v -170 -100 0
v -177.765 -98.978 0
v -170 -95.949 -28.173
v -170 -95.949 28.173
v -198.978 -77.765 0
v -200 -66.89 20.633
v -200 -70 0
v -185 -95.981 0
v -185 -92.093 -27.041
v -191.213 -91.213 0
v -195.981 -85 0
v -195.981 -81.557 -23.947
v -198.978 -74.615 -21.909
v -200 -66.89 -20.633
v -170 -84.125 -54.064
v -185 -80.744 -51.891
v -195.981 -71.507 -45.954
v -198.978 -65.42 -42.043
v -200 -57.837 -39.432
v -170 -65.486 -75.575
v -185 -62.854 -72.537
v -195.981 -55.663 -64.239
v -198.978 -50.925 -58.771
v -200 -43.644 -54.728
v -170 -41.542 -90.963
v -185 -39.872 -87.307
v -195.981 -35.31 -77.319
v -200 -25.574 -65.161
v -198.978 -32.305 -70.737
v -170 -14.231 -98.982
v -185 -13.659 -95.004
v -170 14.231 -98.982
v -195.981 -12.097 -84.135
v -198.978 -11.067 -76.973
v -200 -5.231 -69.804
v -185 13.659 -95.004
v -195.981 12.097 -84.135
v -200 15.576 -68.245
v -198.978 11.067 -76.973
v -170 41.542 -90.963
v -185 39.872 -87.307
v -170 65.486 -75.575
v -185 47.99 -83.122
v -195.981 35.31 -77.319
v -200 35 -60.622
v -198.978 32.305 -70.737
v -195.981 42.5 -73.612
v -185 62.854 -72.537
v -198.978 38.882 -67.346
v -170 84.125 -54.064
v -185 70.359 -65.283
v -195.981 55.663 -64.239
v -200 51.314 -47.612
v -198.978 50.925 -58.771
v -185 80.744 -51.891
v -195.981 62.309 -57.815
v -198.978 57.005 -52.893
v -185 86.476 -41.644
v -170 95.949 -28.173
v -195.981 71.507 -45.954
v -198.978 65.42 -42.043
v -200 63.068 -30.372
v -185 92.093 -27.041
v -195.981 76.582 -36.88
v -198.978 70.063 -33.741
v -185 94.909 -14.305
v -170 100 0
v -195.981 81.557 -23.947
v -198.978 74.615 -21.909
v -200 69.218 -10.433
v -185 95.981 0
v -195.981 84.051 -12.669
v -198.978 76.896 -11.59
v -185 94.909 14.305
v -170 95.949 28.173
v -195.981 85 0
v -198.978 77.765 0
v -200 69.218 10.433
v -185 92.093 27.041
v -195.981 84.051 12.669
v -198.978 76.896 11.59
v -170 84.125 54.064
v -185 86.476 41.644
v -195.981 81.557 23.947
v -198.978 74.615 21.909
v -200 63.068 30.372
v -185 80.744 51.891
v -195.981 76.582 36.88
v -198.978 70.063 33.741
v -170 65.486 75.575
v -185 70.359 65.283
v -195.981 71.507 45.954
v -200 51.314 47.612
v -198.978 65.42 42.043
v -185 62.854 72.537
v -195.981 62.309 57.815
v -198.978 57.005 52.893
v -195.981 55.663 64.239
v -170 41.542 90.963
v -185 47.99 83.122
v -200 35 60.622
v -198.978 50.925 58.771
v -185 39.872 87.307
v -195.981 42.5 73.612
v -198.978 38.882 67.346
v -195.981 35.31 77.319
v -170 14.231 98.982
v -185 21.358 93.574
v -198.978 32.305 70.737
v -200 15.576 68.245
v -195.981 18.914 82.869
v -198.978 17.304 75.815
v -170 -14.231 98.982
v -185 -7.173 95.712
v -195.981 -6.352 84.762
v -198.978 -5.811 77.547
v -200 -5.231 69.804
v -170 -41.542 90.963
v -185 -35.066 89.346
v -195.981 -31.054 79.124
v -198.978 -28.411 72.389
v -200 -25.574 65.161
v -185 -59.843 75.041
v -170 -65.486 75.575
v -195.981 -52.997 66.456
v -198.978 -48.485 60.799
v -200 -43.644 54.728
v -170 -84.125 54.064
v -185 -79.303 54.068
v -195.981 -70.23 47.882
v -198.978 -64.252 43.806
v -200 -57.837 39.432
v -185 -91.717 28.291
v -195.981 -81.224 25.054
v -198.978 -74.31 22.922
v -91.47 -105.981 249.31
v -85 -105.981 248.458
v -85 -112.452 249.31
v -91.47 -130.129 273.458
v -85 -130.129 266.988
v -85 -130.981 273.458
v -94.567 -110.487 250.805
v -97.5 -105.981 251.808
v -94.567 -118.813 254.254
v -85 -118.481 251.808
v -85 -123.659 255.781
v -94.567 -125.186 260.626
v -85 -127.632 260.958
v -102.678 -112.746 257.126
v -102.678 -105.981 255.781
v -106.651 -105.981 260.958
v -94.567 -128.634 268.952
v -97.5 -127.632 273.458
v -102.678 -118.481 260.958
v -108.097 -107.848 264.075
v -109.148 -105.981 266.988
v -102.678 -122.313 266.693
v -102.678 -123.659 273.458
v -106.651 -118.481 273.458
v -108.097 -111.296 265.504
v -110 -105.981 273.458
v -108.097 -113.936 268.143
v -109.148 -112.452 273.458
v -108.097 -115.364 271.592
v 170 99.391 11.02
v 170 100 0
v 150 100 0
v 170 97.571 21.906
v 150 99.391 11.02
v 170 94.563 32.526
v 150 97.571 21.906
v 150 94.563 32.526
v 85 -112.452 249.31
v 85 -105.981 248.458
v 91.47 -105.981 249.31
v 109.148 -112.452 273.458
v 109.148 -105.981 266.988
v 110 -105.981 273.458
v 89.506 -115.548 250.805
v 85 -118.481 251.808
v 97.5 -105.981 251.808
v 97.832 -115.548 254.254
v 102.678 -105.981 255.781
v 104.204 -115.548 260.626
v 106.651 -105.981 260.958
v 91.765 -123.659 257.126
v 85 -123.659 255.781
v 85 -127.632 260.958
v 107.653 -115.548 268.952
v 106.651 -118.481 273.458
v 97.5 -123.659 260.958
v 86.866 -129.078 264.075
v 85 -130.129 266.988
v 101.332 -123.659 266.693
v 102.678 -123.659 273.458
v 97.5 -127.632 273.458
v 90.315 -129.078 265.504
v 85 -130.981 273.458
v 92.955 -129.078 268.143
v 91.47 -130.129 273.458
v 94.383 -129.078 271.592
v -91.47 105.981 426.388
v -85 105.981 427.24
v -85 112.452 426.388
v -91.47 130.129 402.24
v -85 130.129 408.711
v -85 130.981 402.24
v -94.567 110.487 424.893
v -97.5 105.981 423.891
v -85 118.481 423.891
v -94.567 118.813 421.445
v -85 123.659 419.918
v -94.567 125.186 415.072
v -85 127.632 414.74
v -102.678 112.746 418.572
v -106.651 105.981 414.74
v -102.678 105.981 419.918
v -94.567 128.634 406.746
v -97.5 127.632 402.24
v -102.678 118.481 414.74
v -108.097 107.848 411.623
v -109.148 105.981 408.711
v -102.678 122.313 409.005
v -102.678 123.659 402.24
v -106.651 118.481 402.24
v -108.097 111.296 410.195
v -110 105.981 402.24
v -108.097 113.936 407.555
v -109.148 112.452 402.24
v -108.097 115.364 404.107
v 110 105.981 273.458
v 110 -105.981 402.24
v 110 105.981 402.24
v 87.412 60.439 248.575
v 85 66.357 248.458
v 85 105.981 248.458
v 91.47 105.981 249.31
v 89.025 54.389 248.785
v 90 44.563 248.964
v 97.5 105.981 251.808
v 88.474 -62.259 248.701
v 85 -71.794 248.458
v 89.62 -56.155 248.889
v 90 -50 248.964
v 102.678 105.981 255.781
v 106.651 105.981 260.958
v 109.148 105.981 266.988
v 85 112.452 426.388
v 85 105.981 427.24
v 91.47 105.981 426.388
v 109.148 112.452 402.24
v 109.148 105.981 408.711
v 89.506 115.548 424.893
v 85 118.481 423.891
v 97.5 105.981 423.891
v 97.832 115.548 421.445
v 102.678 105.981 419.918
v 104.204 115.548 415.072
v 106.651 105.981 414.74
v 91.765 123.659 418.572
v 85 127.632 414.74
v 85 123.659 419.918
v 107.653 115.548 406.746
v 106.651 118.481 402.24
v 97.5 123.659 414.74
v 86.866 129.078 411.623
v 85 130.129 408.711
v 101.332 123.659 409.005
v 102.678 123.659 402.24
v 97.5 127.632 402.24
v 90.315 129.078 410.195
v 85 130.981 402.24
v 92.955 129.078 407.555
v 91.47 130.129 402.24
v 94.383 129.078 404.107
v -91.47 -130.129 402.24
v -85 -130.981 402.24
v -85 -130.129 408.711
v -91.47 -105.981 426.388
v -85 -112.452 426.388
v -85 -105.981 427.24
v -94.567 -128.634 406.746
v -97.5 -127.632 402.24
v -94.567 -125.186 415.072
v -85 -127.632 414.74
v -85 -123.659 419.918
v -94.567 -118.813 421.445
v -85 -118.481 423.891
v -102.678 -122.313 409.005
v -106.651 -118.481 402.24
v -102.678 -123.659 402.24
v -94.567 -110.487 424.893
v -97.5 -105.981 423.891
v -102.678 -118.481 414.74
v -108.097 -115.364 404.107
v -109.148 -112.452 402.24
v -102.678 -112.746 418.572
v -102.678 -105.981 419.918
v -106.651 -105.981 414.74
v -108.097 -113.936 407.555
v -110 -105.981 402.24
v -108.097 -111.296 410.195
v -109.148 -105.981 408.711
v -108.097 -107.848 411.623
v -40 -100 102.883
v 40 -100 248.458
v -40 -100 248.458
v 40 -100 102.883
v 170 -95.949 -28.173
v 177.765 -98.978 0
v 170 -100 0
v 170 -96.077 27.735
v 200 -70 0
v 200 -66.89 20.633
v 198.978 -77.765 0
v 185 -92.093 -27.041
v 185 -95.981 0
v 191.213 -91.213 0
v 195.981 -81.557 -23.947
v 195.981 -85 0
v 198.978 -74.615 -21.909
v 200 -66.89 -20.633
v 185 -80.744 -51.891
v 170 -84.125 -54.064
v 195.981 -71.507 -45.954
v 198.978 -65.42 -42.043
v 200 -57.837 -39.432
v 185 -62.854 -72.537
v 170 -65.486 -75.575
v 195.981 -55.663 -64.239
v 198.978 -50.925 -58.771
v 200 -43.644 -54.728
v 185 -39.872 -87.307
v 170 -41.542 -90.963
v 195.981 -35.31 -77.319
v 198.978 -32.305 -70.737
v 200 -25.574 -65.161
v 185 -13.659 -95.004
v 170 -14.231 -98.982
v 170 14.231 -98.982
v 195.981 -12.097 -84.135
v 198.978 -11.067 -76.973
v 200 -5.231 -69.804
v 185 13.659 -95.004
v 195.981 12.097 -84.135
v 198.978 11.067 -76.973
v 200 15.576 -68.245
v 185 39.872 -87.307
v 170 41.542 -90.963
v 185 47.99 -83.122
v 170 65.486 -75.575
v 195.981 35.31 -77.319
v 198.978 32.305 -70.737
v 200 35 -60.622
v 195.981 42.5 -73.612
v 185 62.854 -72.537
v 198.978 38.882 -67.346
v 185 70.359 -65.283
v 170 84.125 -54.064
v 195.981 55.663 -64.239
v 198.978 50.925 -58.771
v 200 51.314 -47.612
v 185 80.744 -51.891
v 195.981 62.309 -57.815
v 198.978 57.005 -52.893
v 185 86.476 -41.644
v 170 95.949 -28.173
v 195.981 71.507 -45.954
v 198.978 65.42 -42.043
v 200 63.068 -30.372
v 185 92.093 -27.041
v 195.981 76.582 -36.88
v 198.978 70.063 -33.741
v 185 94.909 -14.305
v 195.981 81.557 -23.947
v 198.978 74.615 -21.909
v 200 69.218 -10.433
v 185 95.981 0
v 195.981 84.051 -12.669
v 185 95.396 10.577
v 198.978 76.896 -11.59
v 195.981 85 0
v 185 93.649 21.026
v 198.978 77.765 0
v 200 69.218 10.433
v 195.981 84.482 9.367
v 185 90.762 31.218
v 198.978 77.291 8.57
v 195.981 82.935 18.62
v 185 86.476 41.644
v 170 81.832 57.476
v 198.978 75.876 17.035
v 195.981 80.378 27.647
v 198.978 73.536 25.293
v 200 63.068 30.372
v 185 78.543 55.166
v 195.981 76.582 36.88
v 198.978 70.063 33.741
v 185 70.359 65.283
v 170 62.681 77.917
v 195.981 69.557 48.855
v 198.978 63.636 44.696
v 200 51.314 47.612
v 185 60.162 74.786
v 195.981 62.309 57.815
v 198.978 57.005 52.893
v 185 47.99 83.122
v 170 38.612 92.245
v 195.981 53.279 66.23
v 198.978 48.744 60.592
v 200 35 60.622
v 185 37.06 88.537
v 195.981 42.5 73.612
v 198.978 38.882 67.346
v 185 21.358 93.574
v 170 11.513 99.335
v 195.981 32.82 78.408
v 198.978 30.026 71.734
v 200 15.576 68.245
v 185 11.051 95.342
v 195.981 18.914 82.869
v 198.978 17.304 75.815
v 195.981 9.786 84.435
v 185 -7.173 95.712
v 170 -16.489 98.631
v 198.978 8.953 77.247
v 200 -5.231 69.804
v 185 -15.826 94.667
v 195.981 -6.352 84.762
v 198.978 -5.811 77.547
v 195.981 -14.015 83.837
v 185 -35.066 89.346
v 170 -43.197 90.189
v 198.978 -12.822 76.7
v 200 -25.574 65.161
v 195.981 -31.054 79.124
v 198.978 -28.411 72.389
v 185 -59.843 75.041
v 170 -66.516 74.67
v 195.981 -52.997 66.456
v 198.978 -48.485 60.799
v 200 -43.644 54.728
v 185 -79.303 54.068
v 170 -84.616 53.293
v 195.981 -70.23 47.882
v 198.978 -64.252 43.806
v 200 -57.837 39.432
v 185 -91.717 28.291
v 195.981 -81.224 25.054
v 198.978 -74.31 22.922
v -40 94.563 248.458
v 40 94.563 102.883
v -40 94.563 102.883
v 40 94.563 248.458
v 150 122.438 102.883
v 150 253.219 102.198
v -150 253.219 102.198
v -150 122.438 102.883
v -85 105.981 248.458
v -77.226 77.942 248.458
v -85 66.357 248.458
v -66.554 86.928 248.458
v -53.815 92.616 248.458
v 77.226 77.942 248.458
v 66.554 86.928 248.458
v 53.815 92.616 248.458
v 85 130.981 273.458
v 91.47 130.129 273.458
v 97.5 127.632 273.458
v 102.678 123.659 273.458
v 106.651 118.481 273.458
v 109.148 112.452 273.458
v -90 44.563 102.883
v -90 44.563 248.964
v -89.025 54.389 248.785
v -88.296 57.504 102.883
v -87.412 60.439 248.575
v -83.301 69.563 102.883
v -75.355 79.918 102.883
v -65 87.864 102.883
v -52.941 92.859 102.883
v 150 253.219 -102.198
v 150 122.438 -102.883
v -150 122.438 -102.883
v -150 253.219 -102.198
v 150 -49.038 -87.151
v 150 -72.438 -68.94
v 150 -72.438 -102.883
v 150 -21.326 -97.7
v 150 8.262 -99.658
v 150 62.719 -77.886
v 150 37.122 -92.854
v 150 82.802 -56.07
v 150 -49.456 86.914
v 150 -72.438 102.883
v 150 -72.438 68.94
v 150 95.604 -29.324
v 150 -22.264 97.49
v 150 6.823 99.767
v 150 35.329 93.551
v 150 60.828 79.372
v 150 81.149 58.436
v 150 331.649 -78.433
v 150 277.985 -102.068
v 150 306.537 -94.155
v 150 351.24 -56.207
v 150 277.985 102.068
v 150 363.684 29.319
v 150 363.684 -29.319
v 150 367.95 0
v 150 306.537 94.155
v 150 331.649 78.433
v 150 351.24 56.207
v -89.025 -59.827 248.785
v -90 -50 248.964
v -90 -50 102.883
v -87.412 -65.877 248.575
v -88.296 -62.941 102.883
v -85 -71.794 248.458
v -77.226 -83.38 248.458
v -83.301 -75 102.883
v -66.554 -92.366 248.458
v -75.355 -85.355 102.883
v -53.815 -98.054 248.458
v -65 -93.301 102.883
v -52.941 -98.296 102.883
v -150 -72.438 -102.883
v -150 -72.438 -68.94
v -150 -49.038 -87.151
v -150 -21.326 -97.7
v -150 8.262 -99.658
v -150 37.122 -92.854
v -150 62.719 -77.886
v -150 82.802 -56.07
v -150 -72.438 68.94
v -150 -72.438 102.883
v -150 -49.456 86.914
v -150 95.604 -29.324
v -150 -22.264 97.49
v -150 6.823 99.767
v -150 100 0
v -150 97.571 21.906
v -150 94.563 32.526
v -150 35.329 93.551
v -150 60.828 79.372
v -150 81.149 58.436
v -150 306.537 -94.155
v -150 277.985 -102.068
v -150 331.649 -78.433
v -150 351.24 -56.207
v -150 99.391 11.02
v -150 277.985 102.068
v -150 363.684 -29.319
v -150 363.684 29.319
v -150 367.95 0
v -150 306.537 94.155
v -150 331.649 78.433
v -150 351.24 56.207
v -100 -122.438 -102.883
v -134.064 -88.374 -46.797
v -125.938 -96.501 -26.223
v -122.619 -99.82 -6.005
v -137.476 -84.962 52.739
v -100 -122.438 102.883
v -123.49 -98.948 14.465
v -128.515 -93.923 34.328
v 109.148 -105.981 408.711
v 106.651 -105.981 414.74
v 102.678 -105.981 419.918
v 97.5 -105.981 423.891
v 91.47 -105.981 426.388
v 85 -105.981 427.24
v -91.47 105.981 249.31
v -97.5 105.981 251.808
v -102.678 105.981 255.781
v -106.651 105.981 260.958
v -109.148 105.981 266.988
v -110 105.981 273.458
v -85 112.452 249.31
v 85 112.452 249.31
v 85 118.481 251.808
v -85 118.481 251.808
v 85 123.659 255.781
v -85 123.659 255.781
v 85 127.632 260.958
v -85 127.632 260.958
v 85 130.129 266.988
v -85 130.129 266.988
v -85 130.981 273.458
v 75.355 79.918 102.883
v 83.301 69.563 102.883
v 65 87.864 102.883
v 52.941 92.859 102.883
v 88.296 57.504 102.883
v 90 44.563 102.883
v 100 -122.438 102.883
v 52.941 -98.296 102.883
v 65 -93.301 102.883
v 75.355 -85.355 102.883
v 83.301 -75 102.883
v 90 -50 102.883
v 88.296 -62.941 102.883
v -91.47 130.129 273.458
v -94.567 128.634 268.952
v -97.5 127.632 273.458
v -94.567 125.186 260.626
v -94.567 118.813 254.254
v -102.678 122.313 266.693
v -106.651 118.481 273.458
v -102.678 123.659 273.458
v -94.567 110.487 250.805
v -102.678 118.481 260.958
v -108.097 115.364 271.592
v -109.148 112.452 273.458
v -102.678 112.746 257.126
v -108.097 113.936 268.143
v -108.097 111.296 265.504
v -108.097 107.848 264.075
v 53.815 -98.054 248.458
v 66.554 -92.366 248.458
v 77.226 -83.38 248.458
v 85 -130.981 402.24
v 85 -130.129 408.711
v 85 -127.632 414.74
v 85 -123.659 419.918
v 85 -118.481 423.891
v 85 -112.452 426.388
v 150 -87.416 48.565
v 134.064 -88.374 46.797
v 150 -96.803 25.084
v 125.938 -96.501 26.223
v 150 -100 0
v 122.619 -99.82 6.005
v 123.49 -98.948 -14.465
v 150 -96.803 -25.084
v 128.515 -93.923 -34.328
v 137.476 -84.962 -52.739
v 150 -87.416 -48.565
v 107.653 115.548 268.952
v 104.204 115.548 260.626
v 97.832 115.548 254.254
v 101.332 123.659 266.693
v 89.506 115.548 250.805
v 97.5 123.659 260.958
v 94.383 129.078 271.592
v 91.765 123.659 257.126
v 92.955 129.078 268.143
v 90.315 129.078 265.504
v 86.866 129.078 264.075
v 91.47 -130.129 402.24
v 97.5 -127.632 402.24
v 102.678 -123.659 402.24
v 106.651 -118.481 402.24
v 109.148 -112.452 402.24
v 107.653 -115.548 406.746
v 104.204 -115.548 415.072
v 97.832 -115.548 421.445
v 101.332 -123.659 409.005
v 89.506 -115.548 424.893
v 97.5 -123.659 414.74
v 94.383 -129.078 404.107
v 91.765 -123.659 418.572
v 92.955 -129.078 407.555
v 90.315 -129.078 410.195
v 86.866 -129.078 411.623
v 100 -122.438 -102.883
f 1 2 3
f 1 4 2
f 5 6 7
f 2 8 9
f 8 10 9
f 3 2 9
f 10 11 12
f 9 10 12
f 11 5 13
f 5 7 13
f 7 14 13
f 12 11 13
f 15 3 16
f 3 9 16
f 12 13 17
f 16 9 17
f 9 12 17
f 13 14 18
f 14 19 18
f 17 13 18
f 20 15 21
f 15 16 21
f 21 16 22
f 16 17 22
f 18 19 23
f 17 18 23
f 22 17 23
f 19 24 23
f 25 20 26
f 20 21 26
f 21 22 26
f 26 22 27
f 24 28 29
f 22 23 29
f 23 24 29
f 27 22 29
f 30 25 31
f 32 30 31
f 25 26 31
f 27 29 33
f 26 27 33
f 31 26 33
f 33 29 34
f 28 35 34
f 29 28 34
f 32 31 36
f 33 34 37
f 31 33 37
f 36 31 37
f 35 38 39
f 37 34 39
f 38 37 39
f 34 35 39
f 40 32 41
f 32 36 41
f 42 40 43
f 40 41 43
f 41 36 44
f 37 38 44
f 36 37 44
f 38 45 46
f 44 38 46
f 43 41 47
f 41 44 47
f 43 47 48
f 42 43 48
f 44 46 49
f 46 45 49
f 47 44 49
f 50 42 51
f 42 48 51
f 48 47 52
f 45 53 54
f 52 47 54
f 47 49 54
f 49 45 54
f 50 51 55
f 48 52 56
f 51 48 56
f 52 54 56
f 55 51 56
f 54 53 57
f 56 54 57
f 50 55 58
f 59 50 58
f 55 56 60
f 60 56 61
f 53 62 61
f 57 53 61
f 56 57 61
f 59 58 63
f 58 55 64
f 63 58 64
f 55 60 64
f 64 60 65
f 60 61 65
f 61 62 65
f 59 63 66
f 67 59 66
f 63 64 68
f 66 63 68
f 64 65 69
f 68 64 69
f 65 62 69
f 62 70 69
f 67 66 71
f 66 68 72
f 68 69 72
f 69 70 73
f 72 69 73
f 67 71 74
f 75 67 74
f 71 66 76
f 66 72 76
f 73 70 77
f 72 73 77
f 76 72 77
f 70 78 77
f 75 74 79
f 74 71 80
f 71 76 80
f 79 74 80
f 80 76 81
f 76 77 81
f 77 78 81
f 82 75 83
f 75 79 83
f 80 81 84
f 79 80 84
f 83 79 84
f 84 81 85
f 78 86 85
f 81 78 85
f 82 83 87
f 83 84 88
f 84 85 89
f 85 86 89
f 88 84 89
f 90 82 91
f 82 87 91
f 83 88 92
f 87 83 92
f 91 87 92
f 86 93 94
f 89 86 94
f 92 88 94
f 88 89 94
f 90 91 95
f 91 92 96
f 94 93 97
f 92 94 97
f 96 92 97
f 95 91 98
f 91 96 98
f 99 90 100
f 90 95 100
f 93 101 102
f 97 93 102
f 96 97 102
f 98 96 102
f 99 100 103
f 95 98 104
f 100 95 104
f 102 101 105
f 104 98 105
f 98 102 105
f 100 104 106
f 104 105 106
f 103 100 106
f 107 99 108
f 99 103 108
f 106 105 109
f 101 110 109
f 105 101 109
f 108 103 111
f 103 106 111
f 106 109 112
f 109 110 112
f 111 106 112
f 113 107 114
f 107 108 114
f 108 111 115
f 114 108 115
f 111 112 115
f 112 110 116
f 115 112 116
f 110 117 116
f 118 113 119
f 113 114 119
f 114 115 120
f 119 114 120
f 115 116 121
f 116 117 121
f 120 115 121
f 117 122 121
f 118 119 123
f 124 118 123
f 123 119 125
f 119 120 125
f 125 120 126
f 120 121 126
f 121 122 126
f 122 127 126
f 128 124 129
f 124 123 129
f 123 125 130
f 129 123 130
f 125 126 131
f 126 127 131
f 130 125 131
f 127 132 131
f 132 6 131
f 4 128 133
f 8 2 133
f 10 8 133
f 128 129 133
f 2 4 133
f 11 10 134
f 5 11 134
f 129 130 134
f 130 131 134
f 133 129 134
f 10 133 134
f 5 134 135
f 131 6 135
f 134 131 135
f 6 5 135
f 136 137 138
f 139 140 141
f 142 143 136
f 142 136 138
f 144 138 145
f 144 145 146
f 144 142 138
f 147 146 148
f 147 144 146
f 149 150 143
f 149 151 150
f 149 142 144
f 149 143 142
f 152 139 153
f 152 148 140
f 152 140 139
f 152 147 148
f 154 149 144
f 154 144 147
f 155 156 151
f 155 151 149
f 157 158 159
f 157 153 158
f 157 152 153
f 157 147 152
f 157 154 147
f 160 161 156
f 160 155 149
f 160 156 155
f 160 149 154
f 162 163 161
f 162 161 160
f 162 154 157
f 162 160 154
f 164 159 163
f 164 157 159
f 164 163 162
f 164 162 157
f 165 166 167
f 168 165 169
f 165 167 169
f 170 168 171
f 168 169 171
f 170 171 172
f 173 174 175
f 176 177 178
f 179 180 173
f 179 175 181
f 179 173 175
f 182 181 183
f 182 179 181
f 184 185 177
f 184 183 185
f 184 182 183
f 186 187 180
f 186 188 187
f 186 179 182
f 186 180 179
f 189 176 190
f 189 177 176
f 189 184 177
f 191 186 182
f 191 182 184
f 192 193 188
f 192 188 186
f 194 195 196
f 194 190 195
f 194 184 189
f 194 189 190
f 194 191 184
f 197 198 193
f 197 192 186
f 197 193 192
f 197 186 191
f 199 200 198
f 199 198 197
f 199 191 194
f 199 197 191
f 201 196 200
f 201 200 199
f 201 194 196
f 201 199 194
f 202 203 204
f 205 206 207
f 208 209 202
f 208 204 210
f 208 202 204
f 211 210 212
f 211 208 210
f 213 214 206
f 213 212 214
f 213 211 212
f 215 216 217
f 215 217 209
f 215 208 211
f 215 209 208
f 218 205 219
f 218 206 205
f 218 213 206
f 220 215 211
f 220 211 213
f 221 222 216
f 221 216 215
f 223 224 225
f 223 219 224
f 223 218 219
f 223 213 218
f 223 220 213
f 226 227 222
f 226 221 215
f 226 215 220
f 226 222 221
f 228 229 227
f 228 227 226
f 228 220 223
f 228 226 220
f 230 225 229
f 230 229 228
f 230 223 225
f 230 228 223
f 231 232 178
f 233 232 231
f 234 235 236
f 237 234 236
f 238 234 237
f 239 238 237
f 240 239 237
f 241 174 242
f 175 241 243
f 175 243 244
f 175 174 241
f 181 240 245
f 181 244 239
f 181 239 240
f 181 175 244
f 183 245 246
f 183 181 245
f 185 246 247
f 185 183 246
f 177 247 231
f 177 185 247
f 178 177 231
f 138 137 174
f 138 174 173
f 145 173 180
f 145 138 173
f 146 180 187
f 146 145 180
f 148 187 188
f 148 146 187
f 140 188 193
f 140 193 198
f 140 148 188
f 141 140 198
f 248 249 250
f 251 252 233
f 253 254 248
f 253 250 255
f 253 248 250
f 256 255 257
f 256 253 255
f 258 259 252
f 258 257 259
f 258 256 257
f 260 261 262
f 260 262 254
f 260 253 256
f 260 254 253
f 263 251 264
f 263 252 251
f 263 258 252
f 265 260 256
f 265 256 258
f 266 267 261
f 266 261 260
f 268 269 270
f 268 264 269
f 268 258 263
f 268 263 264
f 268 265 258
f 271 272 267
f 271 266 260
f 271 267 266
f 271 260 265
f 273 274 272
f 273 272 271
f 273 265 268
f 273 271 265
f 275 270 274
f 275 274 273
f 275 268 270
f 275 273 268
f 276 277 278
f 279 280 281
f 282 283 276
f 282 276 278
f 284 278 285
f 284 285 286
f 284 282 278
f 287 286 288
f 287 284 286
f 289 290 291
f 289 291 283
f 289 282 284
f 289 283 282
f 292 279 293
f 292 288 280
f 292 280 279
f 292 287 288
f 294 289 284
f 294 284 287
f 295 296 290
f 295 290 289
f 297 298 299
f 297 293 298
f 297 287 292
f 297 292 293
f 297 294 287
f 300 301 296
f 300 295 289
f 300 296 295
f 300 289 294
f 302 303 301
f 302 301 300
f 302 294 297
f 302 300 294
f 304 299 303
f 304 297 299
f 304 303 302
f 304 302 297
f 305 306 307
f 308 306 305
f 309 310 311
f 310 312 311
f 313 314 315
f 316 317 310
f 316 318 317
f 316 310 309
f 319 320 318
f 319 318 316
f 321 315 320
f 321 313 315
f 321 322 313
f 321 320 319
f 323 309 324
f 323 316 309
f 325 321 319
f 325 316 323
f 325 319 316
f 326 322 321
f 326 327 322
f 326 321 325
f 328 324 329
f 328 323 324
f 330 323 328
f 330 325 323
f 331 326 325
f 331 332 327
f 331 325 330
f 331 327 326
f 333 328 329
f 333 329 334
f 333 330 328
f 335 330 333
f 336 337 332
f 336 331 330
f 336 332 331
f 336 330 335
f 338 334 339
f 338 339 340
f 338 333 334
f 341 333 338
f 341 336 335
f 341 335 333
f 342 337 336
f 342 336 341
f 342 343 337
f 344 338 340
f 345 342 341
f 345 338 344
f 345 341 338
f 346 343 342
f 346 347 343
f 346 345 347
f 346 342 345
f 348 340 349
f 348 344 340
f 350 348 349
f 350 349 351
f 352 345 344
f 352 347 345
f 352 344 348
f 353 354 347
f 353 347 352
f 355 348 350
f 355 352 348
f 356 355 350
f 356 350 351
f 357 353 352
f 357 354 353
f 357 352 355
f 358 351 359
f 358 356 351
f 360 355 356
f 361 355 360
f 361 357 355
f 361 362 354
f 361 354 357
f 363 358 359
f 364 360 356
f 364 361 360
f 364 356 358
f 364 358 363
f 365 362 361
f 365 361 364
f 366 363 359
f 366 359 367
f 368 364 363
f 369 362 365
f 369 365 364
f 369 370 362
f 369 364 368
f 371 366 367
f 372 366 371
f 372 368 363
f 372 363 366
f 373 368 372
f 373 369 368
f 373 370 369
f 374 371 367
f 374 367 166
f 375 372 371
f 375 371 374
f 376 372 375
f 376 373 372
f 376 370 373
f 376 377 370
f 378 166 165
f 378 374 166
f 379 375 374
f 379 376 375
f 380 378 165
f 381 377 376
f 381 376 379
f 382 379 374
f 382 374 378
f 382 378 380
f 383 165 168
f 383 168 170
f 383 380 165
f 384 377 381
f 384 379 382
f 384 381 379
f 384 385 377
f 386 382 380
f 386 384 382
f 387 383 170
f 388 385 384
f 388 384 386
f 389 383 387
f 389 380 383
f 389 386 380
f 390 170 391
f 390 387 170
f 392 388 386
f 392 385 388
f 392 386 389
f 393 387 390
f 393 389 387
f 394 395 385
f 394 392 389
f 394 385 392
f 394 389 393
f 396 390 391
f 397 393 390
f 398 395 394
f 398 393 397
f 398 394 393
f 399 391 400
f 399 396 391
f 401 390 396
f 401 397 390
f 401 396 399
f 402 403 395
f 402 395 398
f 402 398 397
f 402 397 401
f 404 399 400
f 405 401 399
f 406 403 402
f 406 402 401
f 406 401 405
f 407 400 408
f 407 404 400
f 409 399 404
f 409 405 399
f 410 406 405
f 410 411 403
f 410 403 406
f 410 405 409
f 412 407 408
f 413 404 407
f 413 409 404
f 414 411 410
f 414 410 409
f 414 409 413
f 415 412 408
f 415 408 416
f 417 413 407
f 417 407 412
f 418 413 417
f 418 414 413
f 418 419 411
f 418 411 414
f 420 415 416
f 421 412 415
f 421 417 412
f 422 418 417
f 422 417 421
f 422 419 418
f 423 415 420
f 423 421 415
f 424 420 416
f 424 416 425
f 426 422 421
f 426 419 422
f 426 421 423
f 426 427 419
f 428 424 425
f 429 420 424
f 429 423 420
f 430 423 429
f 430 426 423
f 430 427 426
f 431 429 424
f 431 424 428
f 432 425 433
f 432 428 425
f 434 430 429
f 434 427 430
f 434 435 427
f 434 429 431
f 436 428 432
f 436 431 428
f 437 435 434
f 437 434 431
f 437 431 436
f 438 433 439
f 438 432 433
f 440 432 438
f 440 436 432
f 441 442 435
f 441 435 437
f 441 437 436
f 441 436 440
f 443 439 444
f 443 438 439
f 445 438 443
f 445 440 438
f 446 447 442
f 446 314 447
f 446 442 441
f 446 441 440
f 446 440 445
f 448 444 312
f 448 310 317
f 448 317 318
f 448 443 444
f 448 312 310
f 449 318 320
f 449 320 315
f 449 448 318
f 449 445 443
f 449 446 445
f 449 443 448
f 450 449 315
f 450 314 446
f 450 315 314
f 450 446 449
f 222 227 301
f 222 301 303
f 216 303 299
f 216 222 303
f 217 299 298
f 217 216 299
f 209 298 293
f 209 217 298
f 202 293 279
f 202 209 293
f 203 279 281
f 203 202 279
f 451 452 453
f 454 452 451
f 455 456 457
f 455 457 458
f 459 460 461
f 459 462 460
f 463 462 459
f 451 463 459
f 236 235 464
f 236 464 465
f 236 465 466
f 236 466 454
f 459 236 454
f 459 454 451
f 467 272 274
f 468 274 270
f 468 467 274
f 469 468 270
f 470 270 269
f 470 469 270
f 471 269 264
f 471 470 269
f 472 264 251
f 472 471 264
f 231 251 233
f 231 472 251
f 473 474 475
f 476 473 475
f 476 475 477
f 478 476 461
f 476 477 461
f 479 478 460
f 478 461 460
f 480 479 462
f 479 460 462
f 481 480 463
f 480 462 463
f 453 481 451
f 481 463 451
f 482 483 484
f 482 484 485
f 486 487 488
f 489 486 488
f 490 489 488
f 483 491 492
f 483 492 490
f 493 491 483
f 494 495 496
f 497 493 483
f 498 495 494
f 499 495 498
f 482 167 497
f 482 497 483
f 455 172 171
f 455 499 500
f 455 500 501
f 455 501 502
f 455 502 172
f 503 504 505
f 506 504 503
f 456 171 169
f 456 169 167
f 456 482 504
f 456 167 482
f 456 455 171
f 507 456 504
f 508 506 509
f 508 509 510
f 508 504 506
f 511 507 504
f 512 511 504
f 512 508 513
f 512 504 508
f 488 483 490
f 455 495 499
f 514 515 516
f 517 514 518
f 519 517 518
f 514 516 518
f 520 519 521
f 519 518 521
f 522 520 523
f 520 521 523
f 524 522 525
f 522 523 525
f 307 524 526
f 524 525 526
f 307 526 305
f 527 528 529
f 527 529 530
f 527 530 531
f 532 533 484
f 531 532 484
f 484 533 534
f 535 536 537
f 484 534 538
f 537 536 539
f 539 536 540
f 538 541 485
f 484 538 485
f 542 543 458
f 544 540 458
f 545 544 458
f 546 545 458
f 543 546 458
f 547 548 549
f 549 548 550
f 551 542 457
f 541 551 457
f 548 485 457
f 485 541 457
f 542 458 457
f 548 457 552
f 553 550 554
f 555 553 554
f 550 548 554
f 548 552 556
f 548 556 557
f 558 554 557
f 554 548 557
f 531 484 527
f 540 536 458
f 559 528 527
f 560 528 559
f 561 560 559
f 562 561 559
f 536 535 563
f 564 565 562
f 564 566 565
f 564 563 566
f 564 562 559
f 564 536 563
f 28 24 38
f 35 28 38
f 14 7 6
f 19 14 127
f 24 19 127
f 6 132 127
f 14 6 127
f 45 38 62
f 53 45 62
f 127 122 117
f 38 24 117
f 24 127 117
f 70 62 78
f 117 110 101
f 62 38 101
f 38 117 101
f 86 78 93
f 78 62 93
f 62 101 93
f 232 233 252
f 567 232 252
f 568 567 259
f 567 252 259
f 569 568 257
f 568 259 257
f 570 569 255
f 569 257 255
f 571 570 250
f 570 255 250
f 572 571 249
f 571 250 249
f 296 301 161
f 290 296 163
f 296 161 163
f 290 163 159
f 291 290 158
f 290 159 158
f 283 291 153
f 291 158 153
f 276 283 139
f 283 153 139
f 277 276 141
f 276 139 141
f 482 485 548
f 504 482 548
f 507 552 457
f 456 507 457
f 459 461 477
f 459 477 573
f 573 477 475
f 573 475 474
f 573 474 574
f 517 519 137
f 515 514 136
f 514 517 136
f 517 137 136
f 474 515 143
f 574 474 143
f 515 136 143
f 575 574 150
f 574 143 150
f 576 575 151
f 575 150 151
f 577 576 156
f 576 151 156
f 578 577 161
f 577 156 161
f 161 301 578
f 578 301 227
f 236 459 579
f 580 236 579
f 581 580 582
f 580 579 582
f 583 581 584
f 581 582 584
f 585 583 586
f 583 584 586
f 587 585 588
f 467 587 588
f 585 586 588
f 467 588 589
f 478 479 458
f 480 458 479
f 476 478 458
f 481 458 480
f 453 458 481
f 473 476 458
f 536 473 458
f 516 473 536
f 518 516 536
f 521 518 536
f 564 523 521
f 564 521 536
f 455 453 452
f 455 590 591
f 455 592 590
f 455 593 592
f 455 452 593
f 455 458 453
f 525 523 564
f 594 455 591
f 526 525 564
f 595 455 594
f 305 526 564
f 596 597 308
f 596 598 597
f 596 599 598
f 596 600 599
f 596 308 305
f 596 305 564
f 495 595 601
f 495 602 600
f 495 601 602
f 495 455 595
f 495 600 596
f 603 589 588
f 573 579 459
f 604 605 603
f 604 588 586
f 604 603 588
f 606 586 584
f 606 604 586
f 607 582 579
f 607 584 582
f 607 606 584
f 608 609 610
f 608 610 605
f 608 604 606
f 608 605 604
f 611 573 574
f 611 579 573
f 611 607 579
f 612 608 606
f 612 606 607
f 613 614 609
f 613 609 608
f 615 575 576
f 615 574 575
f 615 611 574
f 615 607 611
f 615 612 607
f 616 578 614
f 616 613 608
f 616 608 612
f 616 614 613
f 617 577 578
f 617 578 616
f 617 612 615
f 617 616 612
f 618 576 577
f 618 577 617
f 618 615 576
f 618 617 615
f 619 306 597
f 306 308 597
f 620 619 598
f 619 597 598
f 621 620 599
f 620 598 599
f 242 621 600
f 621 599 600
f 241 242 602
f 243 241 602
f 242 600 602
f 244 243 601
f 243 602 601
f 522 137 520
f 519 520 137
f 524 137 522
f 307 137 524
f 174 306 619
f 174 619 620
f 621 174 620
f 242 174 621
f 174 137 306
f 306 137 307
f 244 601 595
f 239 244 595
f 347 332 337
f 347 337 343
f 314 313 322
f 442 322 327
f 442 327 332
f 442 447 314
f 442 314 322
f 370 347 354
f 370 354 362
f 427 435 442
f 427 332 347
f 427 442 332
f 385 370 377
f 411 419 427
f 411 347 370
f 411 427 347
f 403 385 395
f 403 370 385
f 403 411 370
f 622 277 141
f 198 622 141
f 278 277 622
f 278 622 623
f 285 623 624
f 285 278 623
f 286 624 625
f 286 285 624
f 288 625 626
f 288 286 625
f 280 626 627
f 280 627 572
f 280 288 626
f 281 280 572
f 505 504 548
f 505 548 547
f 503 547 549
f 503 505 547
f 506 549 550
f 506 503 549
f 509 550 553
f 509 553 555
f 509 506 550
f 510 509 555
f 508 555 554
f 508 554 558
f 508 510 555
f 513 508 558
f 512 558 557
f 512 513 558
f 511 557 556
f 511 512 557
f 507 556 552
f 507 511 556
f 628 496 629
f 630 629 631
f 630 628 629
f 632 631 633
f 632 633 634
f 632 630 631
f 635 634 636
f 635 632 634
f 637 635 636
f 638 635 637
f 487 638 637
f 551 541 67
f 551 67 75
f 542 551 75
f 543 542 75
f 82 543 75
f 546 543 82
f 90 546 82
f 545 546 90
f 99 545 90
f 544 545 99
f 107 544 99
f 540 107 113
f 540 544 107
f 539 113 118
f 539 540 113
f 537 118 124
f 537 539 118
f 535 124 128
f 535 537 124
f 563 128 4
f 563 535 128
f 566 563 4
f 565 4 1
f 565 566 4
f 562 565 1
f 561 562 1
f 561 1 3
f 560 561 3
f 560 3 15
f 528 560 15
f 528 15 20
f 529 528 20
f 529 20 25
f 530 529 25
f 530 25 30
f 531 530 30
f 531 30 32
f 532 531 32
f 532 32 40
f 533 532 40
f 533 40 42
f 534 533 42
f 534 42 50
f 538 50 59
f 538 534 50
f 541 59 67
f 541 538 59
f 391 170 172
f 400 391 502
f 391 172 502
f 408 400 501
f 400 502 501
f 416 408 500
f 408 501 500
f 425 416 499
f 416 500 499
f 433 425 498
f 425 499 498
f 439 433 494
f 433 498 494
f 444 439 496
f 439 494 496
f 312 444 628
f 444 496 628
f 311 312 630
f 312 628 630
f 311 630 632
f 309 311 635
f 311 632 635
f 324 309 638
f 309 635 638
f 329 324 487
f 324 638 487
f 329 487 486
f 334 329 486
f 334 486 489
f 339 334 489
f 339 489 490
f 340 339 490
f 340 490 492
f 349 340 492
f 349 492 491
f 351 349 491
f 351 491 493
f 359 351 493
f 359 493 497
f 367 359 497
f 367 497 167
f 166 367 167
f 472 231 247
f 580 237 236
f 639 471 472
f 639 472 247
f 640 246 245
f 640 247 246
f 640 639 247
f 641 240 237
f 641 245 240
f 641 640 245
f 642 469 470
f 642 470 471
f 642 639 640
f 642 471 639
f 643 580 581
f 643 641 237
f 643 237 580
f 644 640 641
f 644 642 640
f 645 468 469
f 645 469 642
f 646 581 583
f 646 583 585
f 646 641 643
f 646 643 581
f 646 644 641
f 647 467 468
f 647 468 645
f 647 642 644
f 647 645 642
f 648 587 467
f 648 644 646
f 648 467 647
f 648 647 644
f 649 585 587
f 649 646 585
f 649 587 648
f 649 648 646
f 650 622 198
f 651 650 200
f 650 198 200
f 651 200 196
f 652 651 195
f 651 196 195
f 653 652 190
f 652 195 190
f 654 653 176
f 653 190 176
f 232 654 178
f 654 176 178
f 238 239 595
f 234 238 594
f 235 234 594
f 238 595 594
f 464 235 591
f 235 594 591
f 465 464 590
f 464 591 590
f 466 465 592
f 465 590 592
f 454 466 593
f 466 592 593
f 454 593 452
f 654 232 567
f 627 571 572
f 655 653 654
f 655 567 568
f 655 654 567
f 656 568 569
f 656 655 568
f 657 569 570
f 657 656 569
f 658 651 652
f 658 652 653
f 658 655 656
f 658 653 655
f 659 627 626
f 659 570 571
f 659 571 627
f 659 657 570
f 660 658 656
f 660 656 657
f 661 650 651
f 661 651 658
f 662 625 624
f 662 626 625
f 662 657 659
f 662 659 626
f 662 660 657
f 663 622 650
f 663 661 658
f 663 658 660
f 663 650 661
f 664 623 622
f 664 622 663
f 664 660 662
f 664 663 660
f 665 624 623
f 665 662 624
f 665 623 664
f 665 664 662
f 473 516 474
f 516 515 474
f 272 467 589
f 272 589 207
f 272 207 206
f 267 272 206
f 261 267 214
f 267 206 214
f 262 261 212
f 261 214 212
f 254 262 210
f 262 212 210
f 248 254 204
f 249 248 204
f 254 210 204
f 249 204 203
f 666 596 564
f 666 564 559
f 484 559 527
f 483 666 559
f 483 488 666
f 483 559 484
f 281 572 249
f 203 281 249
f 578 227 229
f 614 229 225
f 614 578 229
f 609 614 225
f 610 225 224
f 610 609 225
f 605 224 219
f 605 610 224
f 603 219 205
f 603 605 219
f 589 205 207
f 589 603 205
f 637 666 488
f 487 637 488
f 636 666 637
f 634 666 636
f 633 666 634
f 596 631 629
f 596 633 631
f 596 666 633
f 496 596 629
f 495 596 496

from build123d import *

# Parameters (mm, degrees)
F0_W          = 194.5625826716
F0_H          = 54.5296296477
F1_DEPTH      = 90
F0_W_2        = 261.9621157646
F0_H_2        = 41.3846671581
F0_H_3        = 48.0061769485
F2_DEPTH      = 110
F3_DEPTH      = 150
F4_DEPTH      = 200
F5_T1_DEPTH   = 170
F5_T3_DEPTH   = 211.9621157646
F5_T5_DEPTH   = 128.7816882133
F5_S9_W       = 25
F5_S9_H       = 25
F5_T10_DEPTH  = 25
F5_S15_W      = 25
F5_S15_H      = 25
F5_T16_DEPTH  = 25
F5_S21_W      = 25
F5_S21_H      = 25
F5_T22_DEPTH  = 25
F5_S27_W      = 25
F5_S27_H      = 25
F5_T28_DEPTH  = 25
F5_S33_W      = 25
F5_S33_H      = 25
F5_T34_DEPTH  = 25
F5_S39_W      = 25
F5_S39_H      = 25
F5_T40_DEPTH  = 25
F5_S45_W      = 25
F5_S45_H      = 25
F5_T46_DEPTH  = 25
F5_S51_W      = 25
F5_S51_H      = 25
F5_T52_DEPTH  = 25
F5_T58_DEPTH  = 211.9621157646
F5_T64_DEPTH  = 211.9621157646
F5_T70_DEPTH  = 211.9621157646
F5_T77_DEPTH  = 211.9621157646
F5_T83_DEPTH  = 211.9621157646
F5_T89_DEPTH  = 211.9621157646
F5_T95_DEPTH  = 211.9621157646
F5_T101_DEPTH = 211.9621157646
F5_T108_DEPTH = 211.9621157646
F5_T114_DEPTH = 211.9621157646
F6_R          = 50
F8_T4_DEPTH   = 462.9335014381
F8_S5_R       = 100
F8_T6_DEPTH   = 236
F8_T10_DEPTH  = 462.9335014381
F8_S11_R      = 100
F8_T12_DEPTH  = 236


# Not quite as in the source:
# - a fillet or chamfer that OpenCascade refuses, or shapes differently, is made with other operations: its cross-section is extruded or revolved along the edge and cut away or added


with BuildPart() as f1:
    # F0 (on Right) → F1 (new body, symmetric)
    with BuildSketch(Plane.YZ):
        with Locations((-2.7187086642, 130.1474161446)):
            Rectangle(F0_W, F0_H)
        Polygon((-100, 210.3845775127), (-100, 157.4122309685), (94.5625826716, 157.4122309685), (94.5625826716, 209.366121575), align=None)
        Polygon((-100, 248.4584450722), (-100, 210.3845775127), (94.5625826716, 209.366121575), (94.5625826716, 248.4584450722), align=None)
    extrude(amount=F1_DEPTH, both=True)

    # F0 (on Right) → F2 (join, symmetric)
    with BuildSketch(Plane.YZ):
        Polygon((-130.9810578823, 248.4584450722), (-100, 248.4584450722), (94.5625826716, 248.4584450722), (130.9810578823, 248.4584450722), (130.9810578823, 296.4646220207), (-130.9810578823, 296.4646220207), align=None)
        with Locations((0, 317.1569555998)):
            Rectangle(F0_W_2, F0_H_2)
        with Locations((0, 361.8523776531)):
            Rectangle(F0_W_2, F0_H_3)
        with Locations((0, 406.5477997065)):
            Rectangle(F0_W_2, F0_H_2)
    extrude(amount=F2_DEPTH, both=True)

    # F0 (on Right) → F3 (join, symmetric)
    with BuildSketch(Plane.YZ):
        with BuildLine():
            ThreePointArc((100, 0), (0, -100), (-100, 0))
            Line((-100, 0), (-100, 102.8826013207))
            Line((-100, 102.8826013207), (-122.4384903908, 102.8826013207))
            Line((-122.4384903908, 102.8826013207), (-122.4384903908, -102.8826013207))
            Line((-122.4384903908, -102.8826013207), (122.4384903908, -102.8826013207))
            Line((122.4384903908, -102.8826013207), (122.4384903908, 102.8826013207))
            Line((122.4384903908, 102.8826013207), (94.5625826716, 102.8826013207))
            Line((94.5625826716, 102.8826013207), (94.5625826716, 32.525650777))
            ThreePointArc((94.5625826716, 32.525650777), (98.6312786776, 16.4885071009), (100, 0))
        make_face()
        with BuildLine():
            Line((253.218506448, 102.1980211612), (122.4384903908, 102.8826013207))
            Line((122.4384903908, 102.8826013207), (122.4384903908, -102.8826013207))
            Line((122.4384903908, -102.8826013207), (253.218506448, -102.1980211612))
            ThreePointArc((253.218506448, -102.1980211612), (162.1847078204, 0), (253.218506448, 102.1980211612))
        make_face()
        with BuildLine():
            Line((277.9853632955, 102.0683767451), (253.218506448, 102.1980211612))
            ThreePointArc((253.218506448, 102.1980211612), (162.1847078204, 0), (253.218506448, -102.1980211612))
            Line((253.218506448, -102.1980211612), (277.9853632955, -102.0683767451))
            Line((277.9853632955, -102.0683767451), (277.9853632955, 102.0683767451))
        make_face()
        with BuildLine():
            ThreePointArc((367.9499104619, 0), (342.2485007293, 68.0286213263), (277.9853632955, 102.0683767451))
            Line((277.9853632955, 102.0683767451), (277.9853632955, -102.0683767451))
            ThreePointArc((277.9853632955, -102.0683767451), (342.2485007293, -68.0286213263), (367.9499104619, 0))
        make_face()
        with BuildLine():
            Line((-100, 102.8826013207), (-100, 0))
            ThreePointArc((-100, 0), (-16.4885071009, 98.6312786776), (94.5625826716, 32.525650777))
            Line((94.5625826716, 32.525650777), (94.5625826716, 102.8826013207))
            Line((94.5625826716, 102.8826013207), (-100, 102.8826013207))
        make_face()
    extrude(amount=F3_DEPTH, both=True)

    # F0 (on Right) → F4 (join, symmetric)
    with BuildSketch(Plane.YZ):
        with BuildLine():
            ThreePointArc((94.5625826716, 32.525650777), (-16.4885071009, 98.6312786776), (-100, 0))
            Line((-100, 0), (94.5625826716, 0))
            Line((94.5625826716, 0), (94.5625826716, 32.525650777))
        make_face()
        with BuildLine():
            Line((94.5625826716, 0), (-100, 0))
            ThreePointArc((-100, 0), (0, -100), (100, 0))
            ThreePointArc((100, 0), (98.6312786776, 16.4885071009), (94.5625826716, 32.525650777))
            Line((94.5625826716, 32.525650777), (94.5625826716, 0))
        make_face()
    extrude(amount=F4_DEPTH, both=True)

    # F5: fillet of radius 25 on 12 edges, made by hand

    # F5_s2 → F5_t1 (cut)
    with BuildSketch(Plane.YZ.offset(-85)):
        with BuildLine():
            ThreePointArc((-130.9810578823, 402.2401332855), (-123.658727412, 419.9178028152), (-105.9810578823, 427.2401332855))
            Line((-105.9810578823, 427.2401332855), (-130.9810578823, 427.2401332855))
            Line((-130.9810578823, 427.2401332855), (-130.9810578823, 402.2401332855))
        make_face()
        with BuildLine():
            ThreePointArc((130.9810578823, 402.2401332855), (123.658727412, 419.9178028152), (105.9810578823, 427.2401332855))
            Line((105.9810578823, 427.2401332855), (130.9810578823, 427.2401332855))
            Line((130.9810578823, 427.2401332855), (130.9810578823, 402.2401332855))
        make_face()
        with BuildLine():
            ThreePointArc((-105.9810578823, 248.4584450722), (-123.658727412, 255.7807755425), (-130.9810578823, 273.4584450722))
            Line((-130.9810578823, 273.4584450722), (-130.9810578823, 248.4584450722))
            Line((-130.9810578823, 248.4584450722), (-105.9810578823, 248.4584450722))
        make_face()
        with BuildLine():
            ThreePointArc((105.9810578823, 248.4584450722), (123.658727412, 255.7807755425), (130.9810578823, 273.4584450722))
            Line((130.9810578823, 273.4584450722), (130.9810578823, 248.4584450722))
            Line((130.9810578823, 248.4584450722), (105.9810578823, 248.4584450722))
        make_face()
    extrude(amount=F5_T1_DEPTH, mode=Mode.SUBTRACT)

    # F5_s4 → F5_t3 (cut)
    with BuildSketch(Plane.XZ.offset(-105.9810578823)):
        with BuildLine():
            ThreePointArc((110, 402.2401332855), (102.6776695297, 419.9178028152), (85, 427.2401332855))
            Line((85, 427.2401332855), (110, 427.2401332855))
            Line((110, 427.2401332855), (110, 402.2401332855))
        make_face()
        with BuildLine():
            ThreePointArc((-110, 402.2401332855), (-102.6776695297, 419.9178028152), (-85, 427.2401332855))
            Line((-85, 427.2401332855), (-110, 427.2401332855))
            Line((-110, 427.2401332855), (-110, 402.2401332855))
        make_face()
    extrude(amount=F5_T3_DEPTH, mode=Mode.SUBTRACT)

    # F5_s6 → F5_t5 (cut)
    with BuildSketch(Plane.XY.offset(273.4584450722)):
        with BuildLine():
            ThreePointArc((85, -130.9810578823), (102.6776695297, -123.658727412), (110, -105.9810578823))
            Line((110, -105.9810578823), (110, -130.9810578823))
            Line((110, -130.9810578823), (85, -130.9810578823))
        make_face()
        with BuildLine():
            ThreePointArc((85, 130.9810578823), (102.6776695297, 123.658727412), (110, 105.9810578823))
            Line((110, 105.9810578823), (110, 130.9810578823))
            Line((110, 130.9810578823), (85, 130.9810578823))
        make_face()
        with BuildLine():
            ThreePointArc((-110, -105.9810578823), (-102.6776695297, -123.658727412), (-85, -130.9810578823))
            Line((-85, -130.9810578823), (-110, -130.9810578823))
            Line((-110, -130.9810578823), (-110, -105.9810578823))
        make_face()
        with BuildLine():
            ThreePointArc((-110, 105.9810578823), (-102.6776695297, 123.658727412), (-85, 130.9810578823))
            Line((-85, 130.9810578823), (-110, 130.9810578823))
            Line((-110, 130.9810578823), (-110, 105.9810578823))
        make_face()
    extrude(amount=F5_T5_DEPTH, mode=Mode.SUBTRACT)


with BuildPart() as f5_tool8:
    # F5_s9 → F5_t10 (new body)
    with BuildSketch(Plane.XZ.offset(105.9810578823)):
        with Locations((97.5, 414.7401332855)):
            Rectangle(F5_S9_W, F5_S9_H)
    extrude(amount=F5_T10_DEPTH)

    # F5_s11 → F5_t12 (revolve, cut)
    with BuildSketch(Plane(origin=(85, -105.9810578823, 402.2401332855), x_dir=(-0.7071067812, 0, -0.7071067812), z_dir=(-0.7071067812, 0, 0.7071067812))):
        with BuildLine():
            ThreePointArc((0, -25), (25, 0), (0, 25))
            Line((0, 25), (0, -25))
        make_face()
    revolve(axis=Axis((85, -105.9810578823, 402.2401332855), (0, -1, 0)), mode=Mode.SUBTRACT)


with BuildPart() as f1_1:
    add(f1.part)

    # F5_t7: cut F5_tool8
    add(f5_tool8.part, mode=Mode.SUBTRACT)


with BuildPart() as f5_tool14:
    # F5_s15 → F5_t16 (new body)
    with BuildSketch(Plane.YZ.offset(-85)):
        with Locations((-118.4810578823, 414.7401332855)):
            Rectangle(F5_S15_W, F5_S15_H)
    extrude(amount=-F5_T16_DEPTH)

    # F5_s17 → F5_t18 (revolve, cut)
    with BuildSketch(Plane(origin=(-85, -105.9810578823, 402.2401332855), x_dir=(0, 0.7071067812, -0.7071067812), z_dir=(0, 0.7071067812, 0.7071067812))):
        with BuildLine():
            ThreePointArc((0, -25), (25, 0), (0, 25))
            Line((0, 25), (0, -25))
        make_face()
    revolve(axis=Axis((-85, -105.9810578823, 402.2401332855), (-1, 0, 0)), mode=Mode.SUBTRACT)


with BuildPart() as f1_2:
    add(f1_1.part)

    # F5_t13: cut F5_tool14
    add(f5_tool14.part, mode=Mode.SUBTRACT)


with BuildPart() as f5_tool20:
    # F5_s21 → F5_t22 (new body)
    with BuildSketch(Plane.XZ.offset(-105.9810578823)):
        with Locations((97.5, 414.7401332855)):
            Rectangle(F5_S21_W, F5_S21_H)
    extrude(amount=-F5_T22_DEPTH)

    # F5_s23 → F5_t24 (revolve, cut)
    with BuildSketch(Plane(origin=(85, 105.9810578823, 402.2401332855), x_dir=(-0.7071067812, 0, -0.7071067812), z_dir=(0.7071067812, 0, -0.7071067812))):
        with BuildLine():
            ThreePointArc((0, -25), (25, 0), (0, 25))
            Line((0, 25), (0, -25))
        make_face()
    revolve(axis=Axis((85, 105.9810578823, 402.2401332855), (0, 1, 0)), mode=Mode.SUBTRACT)


with BuildPart() as f1_3:
    add(f1_2.part)

    # F5_t19: cut F5_tool20
    add(f5_tool20.part, mode=Mode.SUBTRACT)


with BuildPart() as f5_tool26:
    # F5_s27 → F5_t28 (new body)
    with BuildSketch(Plane.YZ.offset(-85)):
        with Locations((118.4810578823, 414.7401332855)):
            Rectangle(F5_S27_W, F5_S27_H)
    extrude(amount=-F5_T28_DEPTH)

    # F5_s29 → F5_t30 (revolve, cut)
    with BuildSketch(Plane(origin=(-85, 105.9810578823, 402.2401332855), x_dir=(0, -0.7071067812, -0.7071067812), z_dir=(0, 0.7071067812, -0.7071067812))):
        with BuildLine():
            ThreePointArc((0, -25), (25, 0), (0, 25))
            Line((0, 25), (0, -25))
        make_face()
    revolve(axis=Axis((-85, 105.9810578823, 402.2401332855), (-1, 0, 0)), mode=Mode.SUBTRACT)


with BuildPart() as f1_4:
    add(f1_3.part)

    # F5_t25: cut F5_tool26
    add(f5_tool26.part, mode=Mode.SUBTRACT)


with BuildPart() as f5_tool32:
    # F5_s33 → F5_t34 (new body)
    with BuildSketch(Plane.XZ.offset(105.9810578823)):
        with Locations((97.5, 260.9584450722)):
            Rectangle(F5_S33_W, F5_S33_H)
    extrude(amount=F5_T34_DEPTH)

    # F5_s35 → F5_t36 (revolve, cut)
    with BuildSketch(Plane(origin=(85, -105.9810578823, 273.4584450722), x_dir=(-0.7071067812, 0, 0.7071067812), z_dir=(0.7071067812, 0, 0.7071067812))):
        with BuildLine():
            ThreePointArc((0, -25), (25, 0), (0, 25))
            Line((0, 25), (0, -25))
        make_face()
    revolve(axis=Axis((85, -105.9810578823, 273.4584450722), (0, -1, 0)), mode=Mode.SUBTRACT)


with BuildPart() as f1_5:
    add(f1_4.part)

    # F5_t31: cut F5_tool32
    add(f5_tool32.part, mode=Mode.SUBTRACT)


with BuildPart() as f5_tool38:
    # F5_s39 → F5_t40 (new body)
    with BuildSketch(Plane.XZ.offset(-105.9810578823)):
        with Locations((97.5, 260.9584450722)):
            Rectangle(F5_S39_W, F5_S39_H)
    extrude(amount=-F5_T40_DEPTH)

    # F5_s41 → F5_t42 (revolve, cut)
    with BuildSketch(Plane(origin=(85, 105.9810578823, 273.4584450722), x_dir=(-0.7071067812, 0, 0.7071067812), z_dir=(-0.7071067812, 0, -0.7071067812))):
        with BuildLine():
            ThreePointArc((0, -25), (25, 0), (0, 25))
            Line((0, 25), (0, -25))
        make_face()
    revolve(axis=Axis((85, 105.9810578823, 273.4584450722), (0, 1, 0)), mode=Mode.SUBTRACT)


with BuildPart() as f1_6:
    add(f1_5.part)

    # F5_t37: cut F5_tool38
    add(f5_tool38.part, mode=Mode.SUBTRACT)


with BuildPart() as f5_tool44:
    # F5_s45 → F5_t46 (new body)
    with BuildSketch(Plane.YZ.offset(-85)):
        with Locations((-118.4810578823, 260.9584450722)):
            Rectangle(F5_S45_W, F5_S45_H)
    extrude(amount=-F5_T46_DEPTH)

    # F5_s47 → F5_t48 (revolve, cut)
    with BuildSketch(Plane(origin=(-85, -105.9810578823, 273.4584450722), x_dir=(0, 0.7071067812, 0.7071067812), z_dir=(0, -0.7071067812, 0.7071067812))):
        with BuildLine():
            ThreePointArc((0, -25), (25, 0), (0, 25))
            Line((0, 25), (0, -25))
        make_face()
    revolve(axis=Axis((-85, -105.9810578823, 273.4584450722), (-1, 0, 0)), mode=Mode.SUBTRACT)


with BuildPart() as f1_7:
    add(f1_6.part)

    # F5_t43: cut F5_tool44
    add(f5_tool44.part, mode=Mode.SUBTRACT)


with BuildPart() as f5_tool50:
    # F5_s51 → F5_t52 (new body)
    with BuildSketch(Plane.YZ.offset(-85)):
        with Locations((118.4810578823, 260.9584450722)):
            Rectangle(F5_S51_W, F5_S51_H)
    extrude(amount=-F5_T52_DEPTH)

    # F5_s53 → F5_t54 (revolve, cut)
    with BuildSketch(Plane(origin=(-85, 105.9810578823, 273.4584450722), x_dir=(0, -0.7071067812, 0.7071067812), z_dir=(0, -0.7071067812, -0.7071067812))):
        with BuildLine():
            ThreePointArc((0, -25), (25, 0), (0, 25))
            Line((0, 25), (0, -25))
        make_face()
    revolve(axis=Axis((-85, 105.9810578823, 273.4584450722), (-1, 0, 0)), mode=Mode.SUBTRACT)


with BuildPart() as f1_8:
    add(f1_7.part)

    # F5_t49: cut F5_tool50
    add(f5_tool50.part, mode=Mode.SUBTRACT)


with BuildPart() as f5_tool56:
    # F5_s57 → F5_t58 (new body)
    with BuildSketch(Plane.XZ.offset(105.9810578823)):
        with BuildLine():
            ThreePointArc((85, 248.4584450722), (102.6776695297, 255.7807755425), (110, 273.4584450722))
            Line((110, 273.4584450722), (110, 248.4584450722))
            Line((110, 248.4584450722), (85, 248.4584450722))
        make_face()
    extrude(amount=-F5_T58_DEPTH)

    split(bisect_by=Plane.YZ.offset(90), keep=Keep.BOTTOM)

    split(bisect_by=Plane.XZ.offset(100), keep=Keep.TOP)


with BuildPart() as f1_9:
    add(f1_8.part)

    # F5_t55: cut F5_tool56
    add(f5_tool56.part, mode=Mode.SUBTRACT)


with BuildPart() as f5_tool62:
    # F5_s63 → F5_t64 (new body)
    with BuildSketch(Plane.XZ.offset(105.9810578823)):
        with BuildLine():
            ThreePointArc((85, 248.4584450722), (102.6776695297, 255.7807755425), (110, 273.4584450722))
            Line((110, 273.4584450722), (110, 248.4584450722))
            Line((110, 248.4584450722), (85, 248.4584450722))
        make_face()
    extrude(amount=-F5_T64_DEPTH)

    split(bisect_by=Plane.YZ.offset(90), keep=Keep.TOP)

    split(bisect_by=Plane.XZ.offset(100), keep=Keep.TOP)


with BuildPart() as f1_10:
    add(f1_9.part)

    # F5_t61: cut F5_tool62
    add(f5_tool62.part, mode=Mode.SUBTRACT)


with BuildPart() as f5_tool68:
    # F5_s69 → F5_t70 (new body)
    with BuildSketch(Plane.XZ.offset(105.9810578823)):
        with BuildLine():
            ThreePointArc((85, 248.4584450722), (102.6776695297, 255.7807755425), (110, 273.4584450722))
            Line((110, 273.4584450722), (110, 248.4584450722))
            Line((110, 248.4584450722), (85, 248.4584450722))
        make_face()
    extrude(amount=-F5_T70_DEPTH)

    split(bisect_by=Plane.YZ.offset(90), keep=Keep.TOP)

    split(bisect_by=Plane.XZ.offset(-94.5625826716), keep=Keep.TOP)

    split(bisect_by=Plane.XZ.offset(100), keep=Keep.BOTTOM)


with BuildPart() as f1_11:
    add(f1_10.part)

    # F5_t67: cut F5_tool68
    add(f5_tool68.part, mode=Mode.SUBTRACT)


with BuildPart() as f5_tool75:
    # F5_s76 → F5_t77 (new body)
    with BuildSketch(Plane.XZ.offset(105.9810578823)):
        with BuildLine():
            ThreePointArc((85, 248.4584450722), (102.6776695297, 255.7807755425), (110, 273.4584450722))
            Line((110, 273.4584450722), (110, 248.4584450722))
            Line((110, 248.4584450722), (85, 248.4584450722))
        make_face()
    extrude(amount=-F5_T77_DEPTH)

    split(bisect_by=Plane.YZ.offset(90), keep=Keep.BOTTOM)

    split(bisect_by=Plane.XZ.offset(-94.5625826716), keep=Keep.BOTTOM)


with BuildPart() as f1_12:
    add(f1_11.part)

    # F5_t74: cut F5_tool75
    add(f5_tool75.part, mode=Mode.SUBTRACT)


with BuildPart() as f5_tool81:
    # F5_s82 → F5_t83 (new body)
    with BuildSketch(Plane.XZ.offset(105.9810578823)):
        with BuildLine():
            ThreePointArc((85, 248.4584450722), (102.6776695297, 255.7807755425), (110, 273.4584450722))
            Line((110, 273.4584450722), (110, 248.4584450722))
            Line((110, 248.4584450722), (85, 248.4584450722))
        make_face()
    extrude(amount=-F5_T83_DEPTH)

    split(bisect_by=Plane.YZ.offset(90), keep=Keep.TOP)

    split(bisect_by=Plane.XZ.offset(-94.5625826716), keep=Keep.BOTTOM)


with BuildPart() as f1_13:
    add(f1_12.part)

    # F5_t80: cut F5_tool81
    add(f5_tool81.part, mode=Mode.SUBTRACT)


with BuildPart() as f5_tool87:
    # F5_s88 → F5_t89 (new body)
    with BuildSketch(Plane.XZ.offset(105.9810578823)):
        with BuildLine():
            ThreePointArc((-85, 248.4584450722), (-102.6776695297, 255.7807755425), (-110, 273.4584450722))
            Line((-110, 273.4584450722), (-110, 248.4584450722))
            Line((-110, 248.4584450722), (-85, 248.4584450722))
        make_face()
    extrude(amount=-F5_T89_DEPTH)

    split(bisect_by=Plane.YZ.offset(-90), keep=Keep.TOP)

    split(bisect_by=Plane.XZ.offset(100), keep=Keep.TOP)


with BuildPart() as f1_14:
    add(f1_13.part)

    # F5_t86: cut F5_tool87
    add(f5_tool87.part, mode=Mode.SUBTRACT)


with BuildPart() as f5_tool93:
    # F5_s94 → F5_t95 (new body)
    with BuildSketch(Plane.XZ.offset(105.9810578823)):
        with BuildLine():
            ThreePointArc((-85, 248.4584450722), (-102.6776695297, 255.7807755425), (-110, 273.4584450722))
            Line((-110, 273.4584450722), (-110, 248.4584450722))
            Line((-110, 248.4584450722), (-85, 248.4584450722))
        make_face()
    extrude(amount=-F5_T95_DEPTH)

    split(bisect_by=Plane.YZ.offset(-90), keep=Keep.BOTTOM)

    split(bisect_by=Plane.XZ.offset(100), keep=Keep.TOP)


with BuildPart() as f1_15:
    add(f1_14.part)

    # F5_t92: cut F5_tool93
    add(f5_tool93.part, mode=Mode.SUBTRACT)


with BuildPart() as f5_tool99:
    # F5_s100 → F5_t101 (new body)
    with BuildSketch(Plane.XZ.offset(105.9810578823)):
        with BuildLine():
            ThreePointArc((-85, 248.4584450722), (-102.6776695297, 255.7807755425), (-110, 273.4584450722))
            Line((-110, 273.4584450722), (-110, 248.4584450722))
            Line((-110, 248.4584450722), (-85, 248.4584450722))
        make_face()
    extrude(amount=-F5_T101_DEPTH)

    split(bisect_by=Plane.XZ.offset(-94.5625826716), keep=Keep.TOP)

    split(bisect_by=Plane.YZ.offset(-90), keep=Keep.BOTTOM)

    split(bisect_by=Plane.XZ.offset(100), keep=Keep.BOTTOM)


with BuildPart() as f1_16:
    add(f1_15.part)

    # F5_t98: cut F5_tool99
    add(f5_tool99.part, mode=Mode.SUBTRACT)


with BuildPart() as f5_tool106:
    # F5_s107 → F5_t108 (new body)
    with BuildSketch(Plane.XZ.offset(105.9810578823)):
        with BuildLine():
            ThreePointArc((-85, 248.4584450722), (-102.6776695297, 255.7807755425), (-110, 273.4584450722))
            Line((-110, 273.4584450722), (-110, 248.4584450722))
            Line((-110, 248.4584450722), (-85, 248.4584450722))
        make_face()
    extrude(amount=-F5_T108_DEPTH)

    split(bisect_by=Plane.XZ.offset(-94.5625826716), keep=Keep.BOTTOM)

    split(bisect_by=Plane.YZ.offset(-90), keep=Keep.TOP)


with BuildPart() as f1_17:
    add(f1_16.part)

    # F5_t105: cut F5_tool106
    add(f5_tool106.part, mode=Mode.SUBTRACT)


with BuildPart() as f5_tool112:
    # F5_s113 → F5_t114 (new body)
    with BuildSketch(Plane.XZ.offset(105.9810578823)):
        with BuildLine():
            ThreePointArc((-85, 248.4584450722), (-102.6776695297, 255.7807755425), (-110, 273.4584450722))
            Line((-110, 273.4584450722), (-110, 248.4584450722))
            Line((-110, 248.4584450722), (-85, 248.4584450722))
        make_face()
    extrude(amount=-F5_T114_DEPTH)

    split(bisect_by=Plane.XZ.offset(-94.5625826716), keep=Keep.BOTTOM)

    split(bisect_by=Plane.YZ.offset(-90), keep=Keep.BOTTOM)


with BuildPart() as f1_18:
    add(f1_17.part)

    # F5_t111: cut F5_tool112
    add(f5_tool112.part, mode=Mode.SUBTRACT)

    # F6
    f6_edges = [f1_18.edges().sort_by_distance(p)[0] for p in [
        (90, -100, 175.923074),
        (90, 94.562583, 175.923074),
        (-90, 94.562583, 175.923074),
        (-90, -100, 175.923074),
    ]]
    fillet(f6_edges, radius=F6_R)

    # F7: fillet of radius 30 on 2 edges, made by hand

    # F7_s1 → F7_t2 (revolve, cut)
    with BuildSketch(Plane.XY):
        with BuildLine():
            ThreePointArc((170, -100), (191.2132034356, -91.2132034356), (200, -70))
            Line((200, -70), (200, -100))
            Line((200, -100), (170, -100))
        make_face()
    revolve(axis=Axis((200, 0, 0), (1, 0, 0)), mode=Mode.SUBTRACT)

    # F7_s3 → F7_t4 (revolve, cut)
    with BuildSketch(Plane.XY):
        with BuildLine():
            ThreePointArc((-170, -100), (-191.2132034356, -91.2132034356), (-200, -70))
            Line((-200, -70), (-200, -100))
            Line((-200, -100), (-170, -100))
        make_face()
    revolve(axis=Axis((-200, 0, 0), (1, 0, 0)), mode=Mode.SUBTRACT)

    # F8: chamfer of 50 on 2 edges, made by hand


with BuildPart() as f8_tool2:
    # F8_s3 → F8_t4 (new body)
    with BuildSketch(Plane.XY.offset(231.466750719)):
        Polygon((-150, -72.4384903908), (-100, -122.4384903908), (-150, -122.4384903908), align=None)
    extrude(amount=-F8_T4_DEPTH)

    # F8_s5 → F8_t6 (cut, symmetric)
    with BuildSketch(Plane.YZ.offset(-125)):
        Circle(F8_S5_R)
    extrude(amount=F8_T6_DEPTH, both=True, mode=Mode.SUBTRACT)


with BuildPart() as f1_19:
    add(f1_18.part)

    # F8_t1: cut F8_tool2
    add(f8_tool2.part, mode=Mode.SUBTRACT)


with BuildPart() as f8_tool8:
    # F8_s9 → F8_t10 (new body)
    with BuildSketch(Plane.XY.offset(231.466750719)):
        Polygon((100, -122.4384903908), (150, -72.4384903908), (150, -122.4384903908), align=None)
    extrude(amount=-F8_T10_DEPTH)

    # F8_s11 → F8_t12 (cut, symmetric)
    with BuildSketch(Plane.YZ.offset(125)):
        Circle(F8_S11_R)
    extrude(amount=F8_T12_DEPTH, both=True, mode=Mode.SUBTRACT)


with BuildPart() as f1_20:
    add(f1_19.part)

    # F8_t7: cut F8_tool8
    add(f8_tool8.part, mode=Mode.SUBTRACT)


solid = f1_20.part
